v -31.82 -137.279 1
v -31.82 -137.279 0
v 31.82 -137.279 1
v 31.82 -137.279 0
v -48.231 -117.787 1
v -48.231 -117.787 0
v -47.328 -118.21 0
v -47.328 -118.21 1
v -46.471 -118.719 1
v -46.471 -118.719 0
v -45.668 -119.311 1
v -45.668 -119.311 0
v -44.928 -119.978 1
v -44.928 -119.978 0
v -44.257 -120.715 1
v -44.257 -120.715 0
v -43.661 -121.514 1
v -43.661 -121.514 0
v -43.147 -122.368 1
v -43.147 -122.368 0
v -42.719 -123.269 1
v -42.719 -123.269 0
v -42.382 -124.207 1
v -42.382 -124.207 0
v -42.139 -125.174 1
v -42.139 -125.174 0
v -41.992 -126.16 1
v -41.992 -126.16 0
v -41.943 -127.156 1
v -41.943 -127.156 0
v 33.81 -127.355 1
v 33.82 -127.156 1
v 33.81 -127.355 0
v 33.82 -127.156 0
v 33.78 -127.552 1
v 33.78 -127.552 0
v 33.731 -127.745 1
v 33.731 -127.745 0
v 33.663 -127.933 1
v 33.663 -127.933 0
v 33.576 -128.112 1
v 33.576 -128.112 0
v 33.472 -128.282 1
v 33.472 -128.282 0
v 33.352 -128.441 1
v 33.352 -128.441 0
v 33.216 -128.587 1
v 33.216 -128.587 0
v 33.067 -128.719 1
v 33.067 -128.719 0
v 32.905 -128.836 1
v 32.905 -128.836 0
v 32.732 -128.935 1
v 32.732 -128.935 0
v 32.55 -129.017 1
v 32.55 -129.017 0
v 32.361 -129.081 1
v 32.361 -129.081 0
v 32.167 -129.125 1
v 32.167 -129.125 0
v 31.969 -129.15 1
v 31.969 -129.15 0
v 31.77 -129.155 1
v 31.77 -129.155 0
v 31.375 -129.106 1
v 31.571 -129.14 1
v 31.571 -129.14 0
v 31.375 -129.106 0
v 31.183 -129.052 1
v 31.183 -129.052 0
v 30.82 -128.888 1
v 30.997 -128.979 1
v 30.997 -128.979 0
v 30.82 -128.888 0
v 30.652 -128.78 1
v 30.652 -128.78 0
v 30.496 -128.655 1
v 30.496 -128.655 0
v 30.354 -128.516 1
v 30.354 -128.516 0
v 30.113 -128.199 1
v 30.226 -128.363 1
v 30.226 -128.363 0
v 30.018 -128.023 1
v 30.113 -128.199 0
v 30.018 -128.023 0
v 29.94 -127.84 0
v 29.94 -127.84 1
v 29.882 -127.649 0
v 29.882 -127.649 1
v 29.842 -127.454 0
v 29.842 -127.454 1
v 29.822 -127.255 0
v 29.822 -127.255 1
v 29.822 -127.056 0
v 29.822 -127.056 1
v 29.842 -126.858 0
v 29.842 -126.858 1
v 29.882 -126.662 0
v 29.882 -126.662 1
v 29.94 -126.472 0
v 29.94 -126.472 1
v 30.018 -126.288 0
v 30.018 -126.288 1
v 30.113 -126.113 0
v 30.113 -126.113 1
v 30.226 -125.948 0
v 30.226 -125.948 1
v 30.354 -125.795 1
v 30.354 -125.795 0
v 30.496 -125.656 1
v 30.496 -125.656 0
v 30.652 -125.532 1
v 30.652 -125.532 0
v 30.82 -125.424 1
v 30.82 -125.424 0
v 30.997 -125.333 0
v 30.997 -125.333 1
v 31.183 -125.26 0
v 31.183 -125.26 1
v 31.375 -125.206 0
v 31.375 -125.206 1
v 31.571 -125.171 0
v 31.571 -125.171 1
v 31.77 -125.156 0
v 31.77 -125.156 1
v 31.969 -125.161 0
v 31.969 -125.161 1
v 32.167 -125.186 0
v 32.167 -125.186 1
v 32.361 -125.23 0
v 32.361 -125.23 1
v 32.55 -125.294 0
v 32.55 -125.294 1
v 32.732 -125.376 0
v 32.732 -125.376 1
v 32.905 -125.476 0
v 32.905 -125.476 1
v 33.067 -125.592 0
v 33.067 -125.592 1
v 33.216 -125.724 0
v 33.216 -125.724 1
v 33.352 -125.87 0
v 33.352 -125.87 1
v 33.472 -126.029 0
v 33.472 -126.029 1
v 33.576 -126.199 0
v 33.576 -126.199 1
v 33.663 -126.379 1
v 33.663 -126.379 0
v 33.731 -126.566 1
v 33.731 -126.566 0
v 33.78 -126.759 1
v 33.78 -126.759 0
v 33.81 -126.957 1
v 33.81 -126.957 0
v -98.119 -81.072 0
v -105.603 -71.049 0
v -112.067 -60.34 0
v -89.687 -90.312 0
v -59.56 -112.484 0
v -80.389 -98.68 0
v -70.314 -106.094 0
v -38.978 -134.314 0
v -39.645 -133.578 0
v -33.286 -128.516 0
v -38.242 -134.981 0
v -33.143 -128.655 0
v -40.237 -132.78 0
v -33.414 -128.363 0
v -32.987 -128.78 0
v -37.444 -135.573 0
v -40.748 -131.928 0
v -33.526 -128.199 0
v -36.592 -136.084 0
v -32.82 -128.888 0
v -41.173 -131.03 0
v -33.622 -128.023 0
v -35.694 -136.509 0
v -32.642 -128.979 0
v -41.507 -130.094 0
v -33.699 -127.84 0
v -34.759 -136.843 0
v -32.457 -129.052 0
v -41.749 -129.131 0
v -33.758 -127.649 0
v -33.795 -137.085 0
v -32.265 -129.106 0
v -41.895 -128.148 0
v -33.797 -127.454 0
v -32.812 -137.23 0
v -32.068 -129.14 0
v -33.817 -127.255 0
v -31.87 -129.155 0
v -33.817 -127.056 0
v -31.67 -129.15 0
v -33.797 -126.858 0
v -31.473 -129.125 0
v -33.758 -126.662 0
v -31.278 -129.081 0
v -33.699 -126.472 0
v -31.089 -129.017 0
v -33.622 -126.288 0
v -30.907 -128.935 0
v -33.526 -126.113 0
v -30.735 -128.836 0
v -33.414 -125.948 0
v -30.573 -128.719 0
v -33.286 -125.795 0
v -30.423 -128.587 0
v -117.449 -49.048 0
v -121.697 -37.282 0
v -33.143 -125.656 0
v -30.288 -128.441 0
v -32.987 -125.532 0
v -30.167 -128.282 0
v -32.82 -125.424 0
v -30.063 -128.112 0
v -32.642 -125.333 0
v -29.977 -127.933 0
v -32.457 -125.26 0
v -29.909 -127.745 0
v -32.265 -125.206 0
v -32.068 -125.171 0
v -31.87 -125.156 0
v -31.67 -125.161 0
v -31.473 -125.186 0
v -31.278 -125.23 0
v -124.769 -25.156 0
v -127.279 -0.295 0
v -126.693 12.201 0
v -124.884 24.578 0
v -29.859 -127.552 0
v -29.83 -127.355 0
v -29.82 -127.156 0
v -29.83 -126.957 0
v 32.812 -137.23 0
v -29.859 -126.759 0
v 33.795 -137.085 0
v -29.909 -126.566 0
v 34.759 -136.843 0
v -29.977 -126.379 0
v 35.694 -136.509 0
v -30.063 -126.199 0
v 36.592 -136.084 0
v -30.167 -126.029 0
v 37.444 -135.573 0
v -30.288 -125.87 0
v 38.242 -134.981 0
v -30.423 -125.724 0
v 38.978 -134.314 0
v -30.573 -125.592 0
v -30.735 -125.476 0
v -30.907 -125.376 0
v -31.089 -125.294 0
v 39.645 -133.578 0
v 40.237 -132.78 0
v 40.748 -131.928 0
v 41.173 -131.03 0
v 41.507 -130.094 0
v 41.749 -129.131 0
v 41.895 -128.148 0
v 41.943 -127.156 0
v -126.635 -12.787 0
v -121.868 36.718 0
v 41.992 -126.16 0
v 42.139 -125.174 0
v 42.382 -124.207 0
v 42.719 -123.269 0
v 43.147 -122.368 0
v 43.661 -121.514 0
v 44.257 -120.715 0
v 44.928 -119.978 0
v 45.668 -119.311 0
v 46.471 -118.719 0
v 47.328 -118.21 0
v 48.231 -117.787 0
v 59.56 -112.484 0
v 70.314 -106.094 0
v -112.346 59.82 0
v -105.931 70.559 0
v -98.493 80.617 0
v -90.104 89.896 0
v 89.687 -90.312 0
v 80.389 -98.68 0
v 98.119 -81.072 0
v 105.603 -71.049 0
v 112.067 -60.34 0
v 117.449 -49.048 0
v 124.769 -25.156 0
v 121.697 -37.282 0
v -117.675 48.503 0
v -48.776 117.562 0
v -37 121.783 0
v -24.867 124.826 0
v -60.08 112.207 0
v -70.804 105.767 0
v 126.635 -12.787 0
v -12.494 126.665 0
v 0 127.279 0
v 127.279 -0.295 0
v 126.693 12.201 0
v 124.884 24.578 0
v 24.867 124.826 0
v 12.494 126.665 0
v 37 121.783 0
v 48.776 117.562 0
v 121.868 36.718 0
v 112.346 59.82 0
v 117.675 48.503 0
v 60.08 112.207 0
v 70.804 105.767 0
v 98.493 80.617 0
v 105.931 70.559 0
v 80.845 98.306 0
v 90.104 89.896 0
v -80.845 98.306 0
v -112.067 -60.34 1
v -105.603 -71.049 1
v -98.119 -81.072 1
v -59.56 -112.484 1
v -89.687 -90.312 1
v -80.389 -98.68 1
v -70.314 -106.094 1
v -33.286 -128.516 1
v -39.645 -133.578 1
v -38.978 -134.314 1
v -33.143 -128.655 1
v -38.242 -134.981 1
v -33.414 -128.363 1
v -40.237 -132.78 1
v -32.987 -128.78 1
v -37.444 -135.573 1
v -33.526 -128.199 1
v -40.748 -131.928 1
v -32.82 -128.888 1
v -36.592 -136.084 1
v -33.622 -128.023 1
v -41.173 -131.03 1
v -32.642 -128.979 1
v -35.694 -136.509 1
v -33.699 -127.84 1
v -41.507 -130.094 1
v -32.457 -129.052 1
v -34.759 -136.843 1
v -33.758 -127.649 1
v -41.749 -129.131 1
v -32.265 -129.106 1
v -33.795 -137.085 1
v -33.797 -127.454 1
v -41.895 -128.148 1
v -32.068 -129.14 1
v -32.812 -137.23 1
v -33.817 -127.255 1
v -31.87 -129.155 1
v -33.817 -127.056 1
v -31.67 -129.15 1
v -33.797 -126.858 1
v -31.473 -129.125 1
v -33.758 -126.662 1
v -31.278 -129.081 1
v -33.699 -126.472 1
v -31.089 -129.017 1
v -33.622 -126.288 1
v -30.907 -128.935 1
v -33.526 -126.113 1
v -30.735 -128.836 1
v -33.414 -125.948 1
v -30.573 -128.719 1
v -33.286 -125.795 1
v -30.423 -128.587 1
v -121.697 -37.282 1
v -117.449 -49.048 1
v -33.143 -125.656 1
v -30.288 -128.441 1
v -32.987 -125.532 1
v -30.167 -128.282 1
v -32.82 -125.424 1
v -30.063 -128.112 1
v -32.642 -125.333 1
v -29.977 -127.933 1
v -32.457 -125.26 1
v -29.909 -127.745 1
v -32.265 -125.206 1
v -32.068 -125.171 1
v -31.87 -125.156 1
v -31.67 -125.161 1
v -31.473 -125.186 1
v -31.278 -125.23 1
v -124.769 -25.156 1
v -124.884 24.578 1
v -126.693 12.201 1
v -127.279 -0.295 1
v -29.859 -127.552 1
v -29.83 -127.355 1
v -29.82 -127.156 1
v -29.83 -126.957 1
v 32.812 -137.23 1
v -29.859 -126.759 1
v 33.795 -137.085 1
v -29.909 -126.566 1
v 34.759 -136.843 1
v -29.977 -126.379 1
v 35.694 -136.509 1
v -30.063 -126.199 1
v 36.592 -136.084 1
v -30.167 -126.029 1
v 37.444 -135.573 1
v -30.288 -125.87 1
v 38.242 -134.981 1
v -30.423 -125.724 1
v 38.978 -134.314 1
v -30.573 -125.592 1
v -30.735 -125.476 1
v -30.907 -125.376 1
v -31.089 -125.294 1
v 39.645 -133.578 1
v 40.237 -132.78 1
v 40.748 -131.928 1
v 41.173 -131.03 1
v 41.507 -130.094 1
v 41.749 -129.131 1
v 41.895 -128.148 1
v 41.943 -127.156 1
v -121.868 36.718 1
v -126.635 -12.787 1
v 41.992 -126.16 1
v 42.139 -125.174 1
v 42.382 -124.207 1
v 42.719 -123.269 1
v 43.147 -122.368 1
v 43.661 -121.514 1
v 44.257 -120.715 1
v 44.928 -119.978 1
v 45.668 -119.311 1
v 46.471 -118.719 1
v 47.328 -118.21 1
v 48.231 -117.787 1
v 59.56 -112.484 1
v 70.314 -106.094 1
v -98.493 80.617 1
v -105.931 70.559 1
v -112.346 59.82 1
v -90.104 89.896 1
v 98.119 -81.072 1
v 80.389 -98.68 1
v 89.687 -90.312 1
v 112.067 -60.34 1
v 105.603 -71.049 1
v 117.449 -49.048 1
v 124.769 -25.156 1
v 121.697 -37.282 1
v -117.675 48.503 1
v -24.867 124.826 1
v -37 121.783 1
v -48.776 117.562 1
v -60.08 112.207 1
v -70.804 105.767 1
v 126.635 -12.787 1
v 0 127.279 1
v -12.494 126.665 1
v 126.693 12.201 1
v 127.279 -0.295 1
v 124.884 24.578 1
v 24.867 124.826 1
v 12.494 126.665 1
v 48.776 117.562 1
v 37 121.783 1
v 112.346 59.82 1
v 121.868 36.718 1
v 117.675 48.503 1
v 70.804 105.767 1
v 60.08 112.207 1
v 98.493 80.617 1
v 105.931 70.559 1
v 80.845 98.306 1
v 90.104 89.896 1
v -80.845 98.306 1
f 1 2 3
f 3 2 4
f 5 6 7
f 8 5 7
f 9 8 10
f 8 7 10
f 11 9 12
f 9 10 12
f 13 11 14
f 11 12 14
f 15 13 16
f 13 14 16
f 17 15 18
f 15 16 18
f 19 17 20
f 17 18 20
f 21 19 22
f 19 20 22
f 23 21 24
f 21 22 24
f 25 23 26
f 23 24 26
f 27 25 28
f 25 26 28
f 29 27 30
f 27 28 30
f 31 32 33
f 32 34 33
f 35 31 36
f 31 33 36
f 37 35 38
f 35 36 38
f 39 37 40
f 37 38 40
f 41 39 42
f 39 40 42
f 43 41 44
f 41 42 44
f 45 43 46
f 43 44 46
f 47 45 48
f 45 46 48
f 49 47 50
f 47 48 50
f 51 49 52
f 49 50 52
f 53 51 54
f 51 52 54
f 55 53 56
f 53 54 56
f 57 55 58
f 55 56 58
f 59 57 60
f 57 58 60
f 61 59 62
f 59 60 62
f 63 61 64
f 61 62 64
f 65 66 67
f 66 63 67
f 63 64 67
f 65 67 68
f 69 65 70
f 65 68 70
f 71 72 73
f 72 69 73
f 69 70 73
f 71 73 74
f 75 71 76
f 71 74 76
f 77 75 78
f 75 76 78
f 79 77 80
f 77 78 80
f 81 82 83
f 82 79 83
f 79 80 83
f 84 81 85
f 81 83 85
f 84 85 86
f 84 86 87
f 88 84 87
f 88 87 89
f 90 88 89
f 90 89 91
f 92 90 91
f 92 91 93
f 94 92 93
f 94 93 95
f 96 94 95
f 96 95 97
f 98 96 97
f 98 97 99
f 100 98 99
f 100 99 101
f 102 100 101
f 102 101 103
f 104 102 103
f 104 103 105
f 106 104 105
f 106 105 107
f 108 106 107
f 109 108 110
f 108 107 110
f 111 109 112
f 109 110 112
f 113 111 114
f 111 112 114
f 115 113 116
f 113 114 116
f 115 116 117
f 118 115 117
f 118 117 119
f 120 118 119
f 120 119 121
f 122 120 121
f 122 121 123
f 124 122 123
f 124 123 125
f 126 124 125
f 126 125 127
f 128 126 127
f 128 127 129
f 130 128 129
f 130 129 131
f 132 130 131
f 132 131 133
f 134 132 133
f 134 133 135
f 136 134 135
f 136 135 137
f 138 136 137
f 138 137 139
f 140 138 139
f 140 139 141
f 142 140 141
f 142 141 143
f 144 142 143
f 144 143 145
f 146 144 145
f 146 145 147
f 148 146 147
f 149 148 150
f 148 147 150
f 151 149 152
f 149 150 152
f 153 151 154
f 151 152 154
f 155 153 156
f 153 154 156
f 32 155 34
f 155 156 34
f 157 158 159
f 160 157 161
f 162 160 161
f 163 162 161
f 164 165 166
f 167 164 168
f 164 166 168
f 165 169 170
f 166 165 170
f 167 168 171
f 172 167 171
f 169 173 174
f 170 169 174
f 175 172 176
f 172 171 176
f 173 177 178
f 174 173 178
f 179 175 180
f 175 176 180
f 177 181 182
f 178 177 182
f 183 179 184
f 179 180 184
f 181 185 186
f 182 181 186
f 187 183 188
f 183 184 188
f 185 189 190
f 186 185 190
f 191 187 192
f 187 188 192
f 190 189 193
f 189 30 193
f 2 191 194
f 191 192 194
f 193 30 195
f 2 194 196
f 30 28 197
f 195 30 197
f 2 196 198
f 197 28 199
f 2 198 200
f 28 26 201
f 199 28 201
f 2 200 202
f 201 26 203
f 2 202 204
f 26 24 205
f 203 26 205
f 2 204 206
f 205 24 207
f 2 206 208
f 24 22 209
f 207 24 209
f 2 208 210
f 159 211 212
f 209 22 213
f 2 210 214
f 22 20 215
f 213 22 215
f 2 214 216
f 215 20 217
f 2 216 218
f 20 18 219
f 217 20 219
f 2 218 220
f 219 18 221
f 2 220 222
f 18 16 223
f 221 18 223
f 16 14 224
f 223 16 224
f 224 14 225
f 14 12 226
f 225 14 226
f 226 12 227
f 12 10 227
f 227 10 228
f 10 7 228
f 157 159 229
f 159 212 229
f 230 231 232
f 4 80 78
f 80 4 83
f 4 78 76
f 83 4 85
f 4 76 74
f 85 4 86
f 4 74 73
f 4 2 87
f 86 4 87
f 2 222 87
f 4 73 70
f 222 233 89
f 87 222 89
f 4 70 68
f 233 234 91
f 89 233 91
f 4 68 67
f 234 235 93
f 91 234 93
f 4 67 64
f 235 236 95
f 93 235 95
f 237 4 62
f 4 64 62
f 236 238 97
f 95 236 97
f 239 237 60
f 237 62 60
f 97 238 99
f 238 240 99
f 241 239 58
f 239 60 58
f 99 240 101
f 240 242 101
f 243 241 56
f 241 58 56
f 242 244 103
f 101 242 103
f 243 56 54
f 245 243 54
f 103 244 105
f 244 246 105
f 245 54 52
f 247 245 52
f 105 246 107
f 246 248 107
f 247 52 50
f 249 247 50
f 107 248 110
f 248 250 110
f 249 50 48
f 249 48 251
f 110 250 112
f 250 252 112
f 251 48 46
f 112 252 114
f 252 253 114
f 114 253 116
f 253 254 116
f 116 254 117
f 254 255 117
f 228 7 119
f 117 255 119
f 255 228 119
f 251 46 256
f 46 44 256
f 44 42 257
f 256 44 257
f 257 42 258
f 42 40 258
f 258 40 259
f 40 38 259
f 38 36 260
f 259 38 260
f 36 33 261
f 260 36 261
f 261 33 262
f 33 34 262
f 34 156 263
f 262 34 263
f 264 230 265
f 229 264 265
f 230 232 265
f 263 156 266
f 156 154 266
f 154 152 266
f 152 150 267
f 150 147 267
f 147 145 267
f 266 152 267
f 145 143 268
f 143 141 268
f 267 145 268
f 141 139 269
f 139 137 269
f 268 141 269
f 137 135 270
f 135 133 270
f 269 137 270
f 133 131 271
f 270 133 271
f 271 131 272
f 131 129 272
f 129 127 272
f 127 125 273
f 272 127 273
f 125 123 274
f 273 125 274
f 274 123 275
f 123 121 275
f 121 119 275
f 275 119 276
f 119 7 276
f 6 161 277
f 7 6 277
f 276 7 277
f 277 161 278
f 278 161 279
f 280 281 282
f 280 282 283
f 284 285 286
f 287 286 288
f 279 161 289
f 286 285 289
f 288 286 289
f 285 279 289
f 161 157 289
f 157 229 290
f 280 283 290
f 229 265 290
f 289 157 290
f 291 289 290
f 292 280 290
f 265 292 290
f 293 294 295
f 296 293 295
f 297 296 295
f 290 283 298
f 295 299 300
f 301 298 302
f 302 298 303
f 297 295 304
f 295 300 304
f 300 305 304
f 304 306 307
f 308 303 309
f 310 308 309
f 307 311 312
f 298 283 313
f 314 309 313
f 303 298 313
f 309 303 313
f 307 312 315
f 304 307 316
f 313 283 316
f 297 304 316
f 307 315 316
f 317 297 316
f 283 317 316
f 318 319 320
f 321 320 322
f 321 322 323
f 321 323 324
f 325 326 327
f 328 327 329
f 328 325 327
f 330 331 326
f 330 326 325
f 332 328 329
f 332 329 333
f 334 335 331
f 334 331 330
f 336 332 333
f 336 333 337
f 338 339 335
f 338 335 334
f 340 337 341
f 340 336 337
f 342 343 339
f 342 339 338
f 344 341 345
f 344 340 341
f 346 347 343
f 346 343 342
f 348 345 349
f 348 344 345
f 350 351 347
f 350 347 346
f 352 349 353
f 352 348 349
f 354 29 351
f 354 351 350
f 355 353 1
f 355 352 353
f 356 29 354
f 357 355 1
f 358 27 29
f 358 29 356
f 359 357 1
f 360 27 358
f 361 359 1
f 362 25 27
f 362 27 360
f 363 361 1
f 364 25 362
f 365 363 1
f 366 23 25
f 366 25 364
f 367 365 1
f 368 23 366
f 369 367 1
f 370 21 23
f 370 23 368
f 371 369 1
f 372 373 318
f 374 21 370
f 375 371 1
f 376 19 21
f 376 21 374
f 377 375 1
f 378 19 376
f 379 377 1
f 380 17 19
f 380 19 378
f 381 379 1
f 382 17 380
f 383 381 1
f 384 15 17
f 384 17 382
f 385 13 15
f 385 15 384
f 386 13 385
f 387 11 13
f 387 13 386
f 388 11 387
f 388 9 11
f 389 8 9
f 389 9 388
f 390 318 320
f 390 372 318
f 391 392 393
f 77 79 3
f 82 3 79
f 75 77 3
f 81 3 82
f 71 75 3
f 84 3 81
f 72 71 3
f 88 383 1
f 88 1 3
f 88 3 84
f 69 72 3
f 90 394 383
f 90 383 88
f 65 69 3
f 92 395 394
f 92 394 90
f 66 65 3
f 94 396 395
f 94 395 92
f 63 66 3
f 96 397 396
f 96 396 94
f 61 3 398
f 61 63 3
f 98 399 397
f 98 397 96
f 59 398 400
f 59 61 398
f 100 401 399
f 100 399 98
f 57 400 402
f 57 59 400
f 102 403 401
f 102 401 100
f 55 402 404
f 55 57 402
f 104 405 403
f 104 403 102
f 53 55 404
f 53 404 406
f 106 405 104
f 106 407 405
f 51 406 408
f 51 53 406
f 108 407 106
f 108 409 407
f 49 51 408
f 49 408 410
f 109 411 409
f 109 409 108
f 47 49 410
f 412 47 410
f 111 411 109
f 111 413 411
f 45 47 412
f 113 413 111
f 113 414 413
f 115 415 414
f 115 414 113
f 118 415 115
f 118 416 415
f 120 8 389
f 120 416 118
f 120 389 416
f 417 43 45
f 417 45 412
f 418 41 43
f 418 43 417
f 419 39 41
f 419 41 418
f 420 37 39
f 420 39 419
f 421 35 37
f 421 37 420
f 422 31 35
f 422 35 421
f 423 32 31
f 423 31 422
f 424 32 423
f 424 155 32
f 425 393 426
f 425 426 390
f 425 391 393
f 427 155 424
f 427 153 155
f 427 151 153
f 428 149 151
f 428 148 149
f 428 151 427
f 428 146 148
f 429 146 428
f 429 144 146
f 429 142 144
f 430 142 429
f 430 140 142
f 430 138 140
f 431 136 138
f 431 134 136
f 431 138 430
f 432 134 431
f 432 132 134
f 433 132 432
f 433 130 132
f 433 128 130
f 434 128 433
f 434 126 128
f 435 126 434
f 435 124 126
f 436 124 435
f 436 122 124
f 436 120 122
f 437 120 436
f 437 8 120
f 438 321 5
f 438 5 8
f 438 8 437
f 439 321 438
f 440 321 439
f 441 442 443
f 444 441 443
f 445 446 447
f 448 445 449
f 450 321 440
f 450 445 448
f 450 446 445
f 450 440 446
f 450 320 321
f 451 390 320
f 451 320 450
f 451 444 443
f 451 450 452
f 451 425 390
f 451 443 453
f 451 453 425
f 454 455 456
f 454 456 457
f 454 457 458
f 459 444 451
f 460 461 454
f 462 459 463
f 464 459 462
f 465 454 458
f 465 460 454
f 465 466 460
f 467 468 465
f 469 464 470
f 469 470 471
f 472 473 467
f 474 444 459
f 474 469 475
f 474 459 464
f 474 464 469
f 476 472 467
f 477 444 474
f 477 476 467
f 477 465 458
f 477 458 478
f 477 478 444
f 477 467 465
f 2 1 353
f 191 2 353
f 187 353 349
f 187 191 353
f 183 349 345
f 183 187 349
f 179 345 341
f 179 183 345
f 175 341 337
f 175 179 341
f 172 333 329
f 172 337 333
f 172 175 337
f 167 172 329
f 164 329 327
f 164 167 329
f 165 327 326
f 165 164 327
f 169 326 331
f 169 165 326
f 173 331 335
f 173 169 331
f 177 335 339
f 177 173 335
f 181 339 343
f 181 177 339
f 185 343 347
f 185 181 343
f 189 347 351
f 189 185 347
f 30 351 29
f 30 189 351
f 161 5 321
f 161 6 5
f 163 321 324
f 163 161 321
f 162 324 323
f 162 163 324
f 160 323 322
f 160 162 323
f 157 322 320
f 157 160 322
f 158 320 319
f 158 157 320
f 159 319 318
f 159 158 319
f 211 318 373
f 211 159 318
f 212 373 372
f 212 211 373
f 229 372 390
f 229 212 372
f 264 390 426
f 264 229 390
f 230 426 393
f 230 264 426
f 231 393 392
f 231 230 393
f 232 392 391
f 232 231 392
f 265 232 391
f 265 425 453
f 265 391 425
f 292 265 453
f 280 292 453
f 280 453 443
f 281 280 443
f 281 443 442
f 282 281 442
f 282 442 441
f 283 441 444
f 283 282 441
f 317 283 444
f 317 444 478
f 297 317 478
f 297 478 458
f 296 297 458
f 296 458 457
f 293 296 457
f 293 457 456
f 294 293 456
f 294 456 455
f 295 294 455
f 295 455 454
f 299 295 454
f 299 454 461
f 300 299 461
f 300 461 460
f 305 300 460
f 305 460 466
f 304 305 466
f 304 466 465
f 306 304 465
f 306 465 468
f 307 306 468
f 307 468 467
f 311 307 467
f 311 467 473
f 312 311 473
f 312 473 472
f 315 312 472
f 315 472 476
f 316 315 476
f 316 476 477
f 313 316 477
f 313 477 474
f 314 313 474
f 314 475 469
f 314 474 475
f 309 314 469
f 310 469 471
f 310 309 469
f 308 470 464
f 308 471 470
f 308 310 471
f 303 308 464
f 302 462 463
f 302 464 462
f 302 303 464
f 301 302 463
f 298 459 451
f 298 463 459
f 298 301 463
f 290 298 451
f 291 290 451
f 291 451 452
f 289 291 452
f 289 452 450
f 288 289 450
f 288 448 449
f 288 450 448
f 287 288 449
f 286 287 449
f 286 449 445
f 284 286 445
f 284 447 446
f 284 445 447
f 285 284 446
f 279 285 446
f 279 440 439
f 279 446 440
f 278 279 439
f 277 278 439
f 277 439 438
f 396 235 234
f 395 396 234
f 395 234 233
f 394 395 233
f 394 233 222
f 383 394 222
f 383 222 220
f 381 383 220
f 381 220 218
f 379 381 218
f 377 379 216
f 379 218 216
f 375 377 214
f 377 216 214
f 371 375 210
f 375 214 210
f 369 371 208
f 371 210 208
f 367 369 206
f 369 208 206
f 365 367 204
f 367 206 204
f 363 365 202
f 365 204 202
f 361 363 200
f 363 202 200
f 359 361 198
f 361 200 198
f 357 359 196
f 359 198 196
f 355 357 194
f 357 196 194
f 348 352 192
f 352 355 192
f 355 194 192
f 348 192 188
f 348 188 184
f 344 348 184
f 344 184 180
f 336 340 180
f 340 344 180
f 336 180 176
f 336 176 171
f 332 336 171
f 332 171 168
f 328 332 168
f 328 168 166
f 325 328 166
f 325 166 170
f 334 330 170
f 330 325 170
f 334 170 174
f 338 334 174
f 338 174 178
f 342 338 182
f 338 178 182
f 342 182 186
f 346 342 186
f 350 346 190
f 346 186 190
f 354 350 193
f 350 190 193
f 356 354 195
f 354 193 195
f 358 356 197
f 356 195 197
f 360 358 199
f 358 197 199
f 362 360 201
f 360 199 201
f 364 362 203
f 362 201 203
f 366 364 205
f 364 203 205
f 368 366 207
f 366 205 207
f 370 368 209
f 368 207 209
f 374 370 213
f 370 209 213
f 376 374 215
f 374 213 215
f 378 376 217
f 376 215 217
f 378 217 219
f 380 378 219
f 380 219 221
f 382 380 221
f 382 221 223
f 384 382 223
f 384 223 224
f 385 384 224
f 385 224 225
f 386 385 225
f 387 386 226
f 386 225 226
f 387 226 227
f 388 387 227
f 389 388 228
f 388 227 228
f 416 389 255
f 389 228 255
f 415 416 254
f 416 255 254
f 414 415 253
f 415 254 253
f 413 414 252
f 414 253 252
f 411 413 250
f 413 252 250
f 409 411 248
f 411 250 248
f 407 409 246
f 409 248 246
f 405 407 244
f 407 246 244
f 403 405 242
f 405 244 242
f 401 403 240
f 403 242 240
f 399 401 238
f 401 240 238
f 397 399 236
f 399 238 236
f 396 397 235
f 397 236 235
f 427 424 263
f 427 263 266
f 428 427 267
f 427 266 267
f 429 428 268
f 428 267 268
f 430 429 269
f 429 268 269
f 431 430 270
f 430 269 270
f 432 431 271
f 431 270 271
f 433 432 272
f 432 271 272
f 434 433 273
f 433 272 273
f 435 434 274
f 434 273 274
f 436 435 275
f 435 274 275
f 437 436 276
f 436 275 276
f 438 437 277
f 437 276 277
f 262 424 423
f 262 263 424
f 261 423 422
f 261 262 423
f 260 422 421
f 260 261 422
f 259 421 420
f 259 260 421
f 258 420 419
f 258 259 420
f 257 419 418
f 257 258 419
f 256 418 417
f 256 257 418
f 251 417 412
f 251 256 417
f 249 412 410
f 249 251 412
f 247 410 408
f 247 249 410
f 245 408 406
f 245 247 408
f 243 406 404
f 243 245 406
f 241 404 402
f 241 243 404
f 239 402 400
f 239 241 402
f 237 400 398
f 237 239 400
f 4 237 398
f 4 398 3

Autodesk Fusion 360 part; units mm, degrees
sketch "Round Bed" plane through (0, 0, 0) normal (0, 0, 1) x (1, 0, 0)
  line L0 (-90.1561, -90.1561) -> (90.1561, -90.1561) construction
  line L1 (90.1561, -90.1561) -> (90.1561, 90.1561) construction
  line L2 (90.1561, 90.1561) -> (-90.1561, 90.1561) construction
  line L3 (-90.1561, 90.1561) -> (-90.1561, -90.1561) construction
  line L4 (-90.1561, -90.1561) -> (90.1561, 90.1561) construction
  line L5 (90.1561, -90.1561) -> (-90.1561, 90.1561) construction
  line L6 (-31.875, -137.5) -> (31.875, -137.5)
  line L7 (0, 0) -> (0, -137.5) construction
  arc A0 (-42.0024, -127.3726) -> (-31.875, -137.5) centre (-31.875, -127.3726) ccw
  arc A1 (-42.0024, -127.3726) -> (-48.2938, -117.9998) centre (-52.1298, -127.3726) ccw
  arc A2 (31.875, -137.5) -> (42.0024, -127.3726) centre (31.875, -127.3726) ccw
  arc A3 (48.2938, -117.9998) -> (42.0024, -127.3726) centre (52.1298, -127.3726) ccw
  circle A4 centre (-31.875, -127.3726) radius 2
  circle A5 centre (31.875, -127.3726) radius 2
  arc A6 (48.2938, -117.9998) -> (-48.2938, -117.9998) centre (0, 0) ccw
  dimension "d4" = 255
  dimension "d6" = 63.75
  dimension "d7" = 137.5
  dimension "d10" = 4
sketch "Square Bed" plane through (0, 0, 0) normal (0, 0, 1) x (1, 0, 0)
  line L0 (-90, -90) -> (90, 90) construction
  line L1 (90, -90) -> (-90, 90) construction
  line L2 (-31.8198, -137.2792) -> (31.8198, -137.2792)
  line L3 (90, -90) -> (90, 90) construction
  arc A0 (48.2308, -117.7871) -> (41.9434, -127.1557) centre (52.0669, -127.1557) ccw
  arc A1 (48.2308, -117.7871) -> (-48.2308, -117.7871) centre (0, 0) ccw
  line L4 (-90, 90) -> (-90, -90) construction
  arc A2 (-41.9434, -127.1557) -> (-48.2308, -117.7871) centre (-52.0669, -127.1557) ccw
  arc A3 (-41.9434, -127.1557) -> (-31.8198, -137.2792) centre (-31.8198, -127.1557) ccw
  line L5 (-90, -90) -> (90, -90) construction
  line L6 (90, 90) -> (-90, 90) construction
  circle A4 centre (-31.8198, -127.1557) radius 2
  arc A5 (31.8198, -137.2792) -> (41.9434, -127.1557) centre (31.8198, -127.1557) ccw
  circle A6 centre (31.8198, -127.1557) radius 2
  line L7 (0, 0) -> (0, -137.2792) construction
  dimension "d14" = 63.6396
  dimension "d16" = 4
  dimension "d17" = 180
  dimension "d18" = 127.2792
  dimension "d20" = 137.2792
extrude "Round Bed" [suppressed]
extrude "Square Bed (1)" add sketch "Square Bed" along normal blind 1
equation "d4 = Round_Bed_Size"
equation "d6 = d4 / 4"
equation "d7 = d4 / 2 + 10 mm"
equation "Round_Bed_Size = 255 mm"
equation "Square_Bed_Size = 180 mm"
equation "d14 = ( d18 * 2 ) / 4"
equation "d17 = Square_Bed_Size"
equation "d20 = d18 + 10 mm"
properties part number "180mm Square Bed"
